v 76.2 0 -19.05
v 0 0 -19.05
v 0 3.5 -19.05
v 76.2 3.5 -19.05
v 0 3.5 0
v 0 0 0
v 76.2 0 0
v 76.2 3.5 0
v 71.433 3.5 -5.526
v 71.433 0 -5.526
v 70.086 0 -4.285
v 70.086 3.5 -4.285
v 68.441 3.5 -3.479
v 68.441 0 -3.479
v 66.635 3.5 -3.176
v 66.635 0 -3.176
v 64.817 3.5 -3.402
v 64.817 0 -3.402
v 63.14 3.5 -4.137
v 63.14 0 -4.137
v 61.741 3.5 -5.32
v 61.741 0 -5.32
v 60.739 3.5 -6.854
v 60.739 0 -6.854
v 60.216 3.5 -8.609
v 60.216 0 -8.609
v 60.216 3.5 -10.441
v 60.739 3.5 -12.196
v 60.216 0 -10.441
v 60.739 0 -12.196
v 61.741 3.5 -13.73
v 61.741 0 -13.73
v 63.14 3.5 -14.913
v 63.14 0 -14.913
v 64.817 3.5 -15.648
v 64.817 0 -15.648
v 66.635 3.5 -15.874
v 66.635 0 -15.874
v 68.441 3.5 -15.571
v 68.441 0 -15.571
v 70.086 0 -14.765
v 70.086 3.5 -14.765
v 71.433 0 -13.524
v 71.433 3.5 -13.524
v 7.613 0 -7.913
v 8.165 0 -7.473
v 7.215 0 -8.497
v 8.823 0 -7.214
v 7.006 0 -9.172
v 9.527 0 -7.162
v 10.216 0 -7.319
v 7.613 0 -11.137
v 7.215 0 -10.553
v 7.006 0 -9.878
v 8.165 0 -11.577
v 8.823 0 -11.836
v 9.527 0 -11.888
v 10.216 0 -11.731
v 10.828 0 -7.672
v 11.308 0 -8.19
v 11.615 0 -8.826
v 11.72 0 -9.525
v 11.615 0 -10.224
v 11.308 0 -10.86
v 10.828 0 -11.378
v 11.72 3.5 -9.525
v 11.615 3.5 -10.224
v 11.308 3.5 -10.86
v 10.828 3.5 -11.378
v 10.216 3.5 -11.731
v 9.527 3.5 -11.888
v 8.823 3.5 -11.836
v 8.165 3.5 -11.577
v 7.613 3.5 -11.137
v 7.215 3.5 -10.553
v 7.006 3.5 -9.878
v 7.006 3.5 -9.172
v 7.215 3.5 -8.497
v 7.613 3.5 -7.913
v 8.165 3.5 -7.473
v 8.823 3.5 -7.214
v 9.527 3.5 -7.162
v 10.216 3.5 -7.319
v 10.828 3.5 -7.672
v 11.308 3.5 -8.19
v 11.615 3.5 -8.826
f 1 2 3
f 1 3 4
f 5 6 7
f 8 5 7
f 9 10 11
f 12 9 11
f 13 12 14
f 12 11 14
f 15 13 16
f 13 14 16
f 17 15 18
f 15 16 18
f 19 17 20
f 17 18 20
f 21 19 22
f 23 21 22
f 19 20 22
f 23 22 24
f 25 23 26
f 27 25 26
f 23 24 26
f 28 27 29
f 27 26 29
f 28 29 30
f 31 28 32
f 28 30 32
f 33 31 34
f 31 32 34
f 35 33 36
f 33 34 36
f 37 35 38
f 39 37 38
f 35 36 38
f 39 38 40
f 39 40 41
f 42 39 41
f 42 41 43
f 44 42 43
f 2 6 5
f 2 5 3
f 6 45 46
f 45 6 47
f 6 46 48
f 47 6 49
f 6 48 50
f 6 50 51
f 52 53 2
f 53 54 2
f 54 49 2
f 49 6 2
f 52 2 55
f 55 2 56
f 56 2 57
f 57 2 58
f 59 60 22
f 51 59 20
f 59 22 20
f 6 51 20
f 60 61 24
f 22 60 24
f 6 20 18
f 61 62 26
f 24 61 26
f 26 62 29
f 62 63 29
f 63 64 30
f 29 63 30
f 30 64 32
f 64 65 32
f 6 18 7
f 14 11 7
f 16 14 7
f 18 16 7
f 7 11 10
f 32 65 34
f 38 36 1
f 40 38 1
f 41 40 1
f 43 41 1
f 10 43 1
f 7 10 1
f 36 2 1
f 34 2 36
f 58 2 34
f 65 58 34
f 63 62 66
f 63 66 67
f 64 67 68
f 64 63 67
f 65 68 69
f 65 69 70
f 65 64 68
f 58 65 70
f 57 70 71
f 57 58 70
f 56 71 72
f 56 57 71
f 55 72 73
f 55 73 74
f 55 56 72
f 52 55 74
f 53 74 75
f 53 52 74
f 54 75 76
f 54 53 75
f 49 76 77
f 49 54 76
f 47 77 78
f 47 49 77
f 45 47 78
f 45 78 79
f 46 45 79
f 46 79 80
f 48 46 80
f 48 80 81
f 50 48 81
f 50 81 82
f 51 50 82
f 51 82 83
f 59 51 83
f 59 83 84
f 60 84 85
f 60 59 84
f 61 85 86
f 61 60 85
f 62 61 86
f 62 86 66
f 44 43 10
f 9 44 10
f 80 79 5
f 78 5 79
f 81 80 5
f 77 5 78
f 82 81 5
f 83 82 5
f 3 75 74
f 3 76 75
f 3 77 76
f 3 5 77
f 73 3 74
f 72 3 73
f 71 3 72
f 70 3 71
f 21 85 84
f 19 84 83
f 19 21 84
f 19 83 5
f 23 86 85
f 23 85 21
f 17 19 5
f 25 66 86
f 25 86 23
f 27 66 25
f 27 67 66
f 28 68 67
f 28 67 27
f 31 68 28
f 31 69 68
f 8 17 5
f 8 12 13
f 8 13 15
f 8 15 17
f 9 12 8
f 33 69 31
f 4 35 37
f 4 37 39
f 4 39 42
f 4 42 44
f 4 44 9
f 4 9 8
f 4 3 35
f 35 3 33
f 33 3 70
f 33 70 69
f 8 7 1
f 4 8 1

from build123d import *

# Parameters (mm, degrees)
SKETCH1_W           = 76.2
SKETCH1_H           = 19.05
SKETCH1_R           = 2.37
BOSS_EXTRUDE1_DEPTH = 3.5


with BuildPart() as part:
    # Sketch1 → Boss-Extrude1 (new body)
    with BuildSketch(Plane(origin=(0, 0, 0), x_dir=(1, 0, 0), z_dir=(0, 1, 0))):
        with Locations((38.1, 9.525)):
            Rectangle(SKETCH1_W, SKETCH1_H)
        with Locations((9.35, 9.525)):
            Circle(SKETCH1_R, mode=Mode.SUBTRACT)
        with BuildLine():
            Line((71.433, 13.523501094), (71.433, 5.526498906))
            ThreePointArc((71.433, 5.526498906), (60.15, 9.525), (71.433, 13.523501094))
        make_face(mode=Mode.SUBTRACT)
    extrude(amount=BOSS_EXTRUDE1_DEPTH)


solid = part.part
